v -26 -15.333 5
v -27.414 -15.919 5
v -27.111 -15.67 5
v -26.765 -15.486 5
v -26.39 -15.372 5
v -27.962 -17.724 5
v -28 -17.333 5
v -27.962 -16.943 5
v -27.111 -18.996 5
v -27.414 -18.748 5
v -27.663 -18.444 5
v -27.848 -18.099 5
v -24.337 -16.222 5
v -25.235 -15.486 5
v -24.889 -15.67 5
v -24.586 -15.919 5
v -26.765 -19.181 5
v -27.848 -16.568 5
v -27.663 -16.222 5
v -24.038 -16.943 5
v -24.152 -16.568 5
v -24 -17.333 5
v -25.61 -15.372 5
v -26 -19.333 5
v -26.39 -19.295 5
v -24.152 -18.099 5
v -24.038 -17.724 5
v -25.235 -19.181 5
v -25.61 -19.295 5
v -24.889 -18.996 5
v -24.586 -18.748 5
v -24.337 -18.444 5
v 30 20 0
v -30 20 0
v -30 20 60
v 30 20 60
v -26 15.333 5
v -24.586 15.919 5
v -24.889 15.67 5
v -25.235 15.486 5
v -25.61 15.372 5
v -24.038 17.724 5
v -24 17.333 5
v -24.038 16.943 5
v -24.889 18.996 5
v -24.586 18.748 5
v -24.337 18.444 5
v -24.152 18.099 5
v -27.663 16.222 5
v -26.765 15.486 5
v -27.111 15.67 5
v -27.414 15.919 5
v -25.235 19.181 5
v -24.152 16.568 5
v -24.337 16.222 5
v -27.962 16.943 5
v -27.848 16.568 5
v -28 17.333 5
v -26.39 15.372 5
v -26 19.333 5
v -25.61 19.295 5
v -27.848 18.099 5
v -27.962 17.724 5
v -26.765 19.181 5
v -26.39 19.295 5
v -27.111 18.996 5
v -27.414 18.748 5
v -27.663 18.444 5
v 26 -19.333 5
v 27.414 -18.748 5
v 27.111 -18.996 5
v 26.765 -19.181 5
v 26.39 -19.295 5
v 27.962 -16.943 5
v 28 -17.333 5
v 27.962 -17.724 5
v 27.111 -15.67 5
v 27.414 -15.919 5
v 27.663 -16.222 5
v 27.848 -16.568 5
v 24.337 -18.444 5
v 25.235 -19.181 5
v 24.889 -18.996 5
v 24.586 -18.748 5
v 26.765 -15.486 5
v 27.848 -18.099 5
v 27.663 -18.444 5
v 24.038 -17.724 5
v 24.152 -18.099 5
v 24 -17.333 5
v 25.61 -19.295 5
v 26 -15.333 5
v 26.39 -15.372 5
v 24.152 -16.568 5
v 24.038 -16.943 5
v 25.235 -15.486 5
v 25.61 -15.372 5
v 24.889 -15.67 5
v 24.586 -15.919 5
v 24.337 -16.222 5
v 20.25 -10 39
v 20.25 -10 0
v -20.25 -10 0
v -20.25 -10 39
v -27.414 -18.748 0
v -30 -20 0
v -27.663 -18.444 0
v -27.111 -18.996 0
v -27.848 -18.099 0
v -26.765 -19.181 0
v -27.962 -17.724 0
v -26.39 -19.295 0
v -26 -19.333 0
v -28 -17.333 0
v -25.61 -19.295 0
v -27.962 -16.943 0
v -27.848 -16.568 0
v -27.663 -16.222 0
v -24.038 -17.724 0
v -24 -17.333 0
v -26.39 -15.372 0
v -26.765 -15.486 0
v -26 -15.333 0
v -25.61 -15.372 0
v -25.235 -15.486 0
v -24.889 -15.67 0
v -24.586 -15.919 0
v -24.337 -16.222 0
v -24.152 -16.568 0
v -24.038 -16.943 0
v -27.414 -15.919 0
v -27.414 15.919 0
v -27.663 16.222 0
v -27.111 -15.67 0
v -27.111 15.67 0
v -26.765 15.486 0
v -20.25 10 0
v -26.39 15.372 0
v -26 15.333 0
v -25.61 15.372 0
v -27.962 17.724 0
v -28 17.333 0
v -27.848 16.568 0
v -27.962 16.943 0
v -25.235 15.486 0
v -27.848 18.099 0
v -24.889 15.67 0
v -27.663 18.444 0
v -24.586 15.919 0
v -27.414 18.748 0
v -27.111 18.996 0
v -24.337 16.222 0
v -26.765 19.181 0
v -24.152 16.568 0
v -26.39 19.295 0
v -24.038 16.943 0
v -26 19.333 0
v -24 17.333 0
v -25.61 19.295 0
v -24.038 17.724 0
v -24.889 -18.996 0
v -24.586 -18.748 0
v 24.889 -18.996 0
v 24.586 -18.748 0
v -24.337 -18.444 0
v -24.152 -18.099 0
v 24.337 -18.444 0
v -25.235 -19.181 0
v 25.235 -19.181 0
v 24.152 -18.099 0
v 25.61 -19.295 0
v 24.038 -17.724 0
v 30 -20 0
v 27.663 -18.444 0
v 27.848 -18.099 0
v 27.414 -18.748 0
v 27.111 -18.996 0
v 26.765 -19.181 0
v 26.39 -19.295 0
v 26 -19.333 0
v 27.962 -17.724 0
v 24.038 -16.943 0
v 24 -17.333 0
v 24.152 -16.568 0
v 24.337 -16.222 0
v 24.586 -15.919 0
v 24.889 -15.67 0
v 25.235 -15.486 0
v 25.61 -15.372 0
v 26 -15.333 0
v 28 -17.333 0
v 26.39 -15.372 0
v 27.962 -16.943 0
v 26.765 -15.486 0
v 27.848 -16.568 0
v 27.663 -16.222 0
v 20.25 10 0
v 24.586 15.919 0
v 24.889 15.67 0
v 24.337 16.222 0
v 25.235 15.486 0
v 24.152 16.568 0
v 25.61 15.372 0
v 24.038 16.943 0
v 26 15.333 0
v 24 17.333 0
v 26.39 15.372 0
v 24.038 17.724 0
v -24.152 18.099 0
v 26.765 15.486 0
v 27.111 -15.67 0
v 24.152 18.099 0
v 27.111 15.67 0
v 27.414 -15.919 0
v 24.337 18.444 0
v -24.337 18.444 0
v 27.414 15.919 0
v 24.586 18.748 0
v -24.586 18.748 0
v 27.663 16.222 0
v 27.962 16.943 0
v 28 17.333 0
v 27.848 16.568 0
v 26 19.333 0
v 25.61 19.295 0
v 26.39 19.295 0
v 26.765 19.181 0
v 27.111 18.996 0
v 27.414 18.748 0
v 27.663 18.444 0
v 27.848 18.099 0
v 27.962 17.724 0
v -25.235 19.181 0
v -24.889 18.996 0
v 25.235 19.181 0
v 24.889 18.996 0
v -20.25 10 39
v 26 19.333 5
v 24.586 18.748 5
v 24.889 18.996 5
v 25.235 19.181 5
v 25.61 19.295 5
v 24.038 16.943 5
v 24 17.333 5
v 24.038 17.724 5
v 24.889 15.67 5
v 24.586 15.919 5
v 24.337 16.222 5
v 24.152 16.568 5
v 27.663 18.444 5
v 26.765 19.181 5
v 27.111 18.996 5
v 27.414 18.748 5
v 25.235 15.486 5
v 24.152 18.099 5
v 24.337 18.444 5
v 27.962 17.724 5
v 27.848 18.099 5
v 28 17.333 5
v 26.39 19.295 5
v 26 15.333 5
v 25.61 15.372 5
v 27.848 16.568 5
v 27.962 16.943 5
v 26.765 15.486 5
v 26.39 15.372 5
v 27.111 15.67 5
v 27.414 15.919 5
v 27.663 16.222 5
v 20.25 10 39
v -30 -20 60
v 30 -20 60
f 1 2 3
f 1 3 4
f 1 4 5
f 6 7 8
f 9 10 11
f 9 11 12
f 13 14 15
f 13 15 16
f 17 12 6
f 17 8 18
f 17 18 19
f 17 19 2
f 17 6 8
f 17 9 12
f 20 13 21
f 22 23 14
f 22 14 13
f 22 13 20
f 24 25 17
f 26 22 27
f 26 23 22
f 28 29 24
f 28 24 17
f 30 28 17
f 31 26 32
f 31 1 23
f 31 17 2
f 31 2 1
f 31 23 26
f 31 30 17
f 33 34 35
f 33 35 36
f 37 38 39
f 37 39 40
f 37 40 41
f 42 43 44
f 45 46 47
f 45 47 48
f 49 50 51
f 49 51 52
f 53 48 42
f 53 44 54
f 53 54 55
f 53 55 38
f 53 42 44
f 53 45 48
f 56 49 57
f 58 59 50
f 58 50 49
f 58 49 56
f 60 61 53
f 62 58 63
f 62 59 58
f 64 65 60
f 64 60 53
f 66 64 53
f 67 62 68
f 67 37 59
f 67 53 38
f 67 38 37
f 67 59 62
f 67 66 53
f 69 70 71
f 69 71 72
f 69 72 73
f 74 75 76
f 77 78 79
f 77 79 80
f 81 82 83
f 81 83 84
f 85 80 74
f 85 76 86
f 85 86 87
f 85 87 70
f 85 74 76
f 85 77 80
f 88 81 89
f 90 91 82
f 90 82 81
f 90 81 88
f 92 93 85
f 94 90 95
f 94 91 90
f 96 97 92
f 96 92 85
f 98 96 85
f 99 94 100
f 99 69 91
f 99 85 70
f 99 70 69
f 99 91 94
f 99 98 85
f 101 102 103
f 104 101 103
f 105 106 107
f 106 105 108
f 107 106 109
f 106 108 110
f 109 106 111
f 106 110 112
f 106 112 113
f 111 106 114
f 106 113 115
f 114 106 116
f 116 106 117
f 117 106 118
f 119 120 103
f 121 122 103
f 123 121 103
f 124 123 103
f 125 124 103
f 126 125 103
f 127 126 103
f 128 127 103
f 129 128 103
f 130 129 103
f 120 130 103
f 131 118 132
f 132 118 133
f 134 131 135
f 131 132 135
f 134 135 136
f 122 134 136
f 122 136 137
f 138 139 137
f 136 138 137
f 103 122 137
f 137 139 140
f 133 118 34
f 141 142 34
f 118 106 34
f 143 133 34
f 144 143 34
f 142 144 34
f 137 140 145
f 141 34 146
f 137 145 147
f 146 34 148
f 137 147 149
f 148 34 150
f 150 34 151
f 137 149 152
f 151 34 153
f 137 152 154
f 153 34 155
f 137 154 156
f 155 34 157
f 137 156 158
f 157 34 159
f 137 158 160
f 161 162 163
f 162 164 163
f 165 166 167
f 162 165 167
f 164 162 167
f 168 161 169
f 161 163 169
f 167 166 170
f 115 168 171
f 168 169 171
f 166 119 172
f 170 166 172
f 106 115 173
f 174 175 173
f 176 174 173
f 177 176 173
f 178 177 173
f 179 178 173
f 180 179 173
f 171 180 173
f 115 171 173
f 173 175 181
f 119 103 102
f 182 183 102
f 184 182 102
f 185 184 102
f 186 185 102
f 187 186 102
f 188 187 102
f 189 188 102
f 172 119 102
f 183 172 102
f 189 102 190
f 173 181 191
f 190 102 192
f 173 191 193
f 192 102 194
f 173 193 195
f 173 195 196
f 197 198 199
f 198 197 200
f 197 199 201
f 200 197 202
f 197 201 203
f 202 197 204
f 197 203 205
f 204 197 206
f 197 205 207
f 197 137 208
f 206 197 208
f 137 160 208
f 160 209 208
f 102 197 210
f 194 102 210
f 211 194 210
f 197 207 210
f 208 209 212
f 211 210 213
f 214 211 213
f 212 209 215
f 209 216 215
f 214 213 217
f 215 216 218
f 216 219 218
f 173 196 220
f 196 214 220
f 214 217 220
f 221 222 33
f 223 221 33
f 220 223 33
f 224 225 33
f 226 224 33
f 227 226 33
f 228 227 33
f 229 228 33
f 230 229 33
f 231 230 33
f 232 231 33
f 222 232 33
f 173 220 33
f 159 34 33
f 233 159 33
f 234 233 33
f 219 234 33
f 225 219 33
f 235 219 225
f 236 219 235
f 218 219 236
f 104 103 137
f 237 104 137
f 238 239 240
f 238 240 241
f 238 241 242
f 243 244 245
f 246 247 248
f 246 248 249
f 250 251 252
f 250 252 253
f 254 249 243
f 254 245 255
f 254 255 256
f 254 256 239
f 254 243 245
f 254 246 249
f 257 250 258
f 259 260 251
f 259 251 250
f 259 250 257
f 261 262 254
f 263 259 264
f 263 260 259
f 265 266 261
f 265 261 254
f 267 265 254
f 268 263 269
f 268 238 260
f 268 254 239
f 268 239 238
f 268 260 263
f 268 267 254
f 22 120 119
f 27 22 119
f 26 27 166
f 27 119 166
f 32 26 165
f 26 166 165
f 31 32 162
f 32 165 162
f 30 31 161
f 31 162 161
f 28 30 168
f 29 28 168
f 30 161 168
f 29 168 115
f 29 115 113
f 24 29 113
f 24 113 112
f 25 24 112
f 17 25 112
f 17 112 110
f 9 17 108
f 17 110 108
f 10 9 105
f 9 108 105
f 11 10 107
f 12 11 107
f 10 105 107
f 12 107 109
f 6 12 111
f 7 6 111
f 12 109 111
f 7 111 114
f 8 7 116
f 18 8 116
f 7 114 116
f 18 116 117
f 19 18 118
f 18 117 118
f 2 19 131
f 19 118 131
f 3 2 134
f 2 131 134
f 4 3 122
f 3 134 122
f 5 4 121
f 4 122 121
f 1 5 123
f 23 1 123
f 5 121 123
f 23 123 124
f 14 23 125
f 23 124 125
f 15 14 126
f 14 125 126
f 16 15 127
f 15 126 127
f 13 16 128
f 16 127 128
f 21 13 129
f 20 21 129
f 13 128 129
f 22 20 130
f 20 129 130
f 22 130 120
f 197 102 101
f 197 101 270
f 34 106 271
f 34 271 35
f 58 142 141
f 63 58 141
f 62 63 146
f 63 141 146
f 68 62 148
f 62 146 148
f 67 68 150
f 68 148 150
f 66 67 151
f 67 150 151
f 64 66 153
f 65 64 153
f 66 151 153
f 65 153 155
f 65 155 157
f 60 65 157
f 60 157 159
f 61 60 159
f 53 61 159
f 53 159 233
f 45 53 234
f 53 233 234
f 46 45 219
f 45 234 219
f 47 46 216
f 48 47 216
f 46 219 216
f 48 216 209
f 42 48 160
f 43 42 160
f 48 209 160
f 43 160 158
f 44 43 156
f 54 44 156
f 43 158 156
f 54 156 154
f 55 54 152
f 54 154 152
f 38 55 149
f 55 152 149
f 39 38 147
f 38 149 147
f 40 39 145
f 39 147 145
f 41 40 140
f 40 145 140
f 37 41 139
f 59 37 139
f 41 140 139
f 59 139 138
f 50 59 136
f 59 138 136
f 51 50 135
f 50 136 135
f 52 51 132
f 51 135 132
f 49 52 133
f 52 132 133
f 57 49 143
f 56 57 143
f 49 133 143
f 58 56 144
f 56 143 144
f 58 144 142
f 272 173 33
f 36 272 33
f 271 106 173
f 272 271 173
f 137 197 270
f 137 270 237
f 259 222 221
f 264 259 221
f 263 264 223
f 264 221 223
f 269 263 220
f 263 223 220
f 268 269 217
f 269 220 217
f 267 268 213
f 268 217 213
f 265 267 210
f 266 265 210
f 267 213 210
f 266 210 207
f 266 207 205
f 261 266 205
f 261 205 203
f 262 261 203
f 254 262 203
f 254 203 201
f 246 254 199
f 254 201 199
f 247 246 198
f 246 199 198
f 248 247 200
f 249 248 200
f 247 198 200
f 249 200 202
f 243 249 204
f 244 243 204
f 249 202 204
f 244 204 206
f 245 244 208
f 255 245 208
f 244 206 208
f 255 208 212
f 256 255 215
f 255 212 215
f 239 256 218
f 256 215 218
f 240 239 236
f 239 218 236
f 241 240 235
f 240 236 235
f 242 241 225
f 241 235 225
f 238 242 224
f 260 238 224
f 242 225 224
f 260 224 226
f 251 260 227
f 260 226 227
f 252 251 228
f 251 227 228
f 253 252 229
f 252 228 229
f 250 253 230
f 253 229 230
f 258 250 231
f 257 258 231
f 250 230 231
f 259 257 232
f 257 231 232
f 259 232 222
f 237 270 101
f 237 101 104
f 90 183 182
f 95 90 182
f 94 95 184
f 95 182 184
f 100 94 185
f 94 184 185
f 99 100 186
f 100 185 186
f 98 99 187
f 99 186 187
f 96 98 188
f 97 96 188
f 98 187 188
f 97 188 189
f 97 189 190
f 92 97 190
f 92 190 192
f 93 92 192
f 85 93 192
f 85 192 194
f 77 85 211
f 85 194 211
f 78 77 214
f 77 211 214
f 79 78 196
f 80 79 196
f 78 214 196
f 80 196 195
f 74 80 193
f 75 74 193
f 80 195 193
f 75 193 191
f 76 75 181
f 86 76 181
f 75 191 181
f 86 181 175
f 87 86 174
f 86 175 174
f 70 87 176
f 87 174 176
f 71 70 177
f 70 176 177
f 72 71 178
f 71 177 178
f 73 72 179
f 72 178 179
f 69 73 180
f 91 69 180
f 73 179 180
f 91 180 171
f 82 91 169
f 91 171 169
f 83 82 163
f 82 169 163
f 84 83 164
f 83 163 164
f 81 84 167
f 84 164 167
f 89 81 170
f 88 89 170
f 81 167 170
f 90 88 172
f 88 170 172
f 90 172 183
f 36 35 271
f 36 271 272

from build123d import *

# Parameters (mm, degrees)
SKETCH1_W           = 60
SKETCH1_H           = 40
BOSS_EXTRUDE1_DEPTH = 60
SKETCH2_W           = 40.5
SKETCH2_H           = 20
CUT_EXTRUDE1_DEPTH  = 39
SKETCH3_R           = 2
CUT_EXTRUDE2_DEPTH  = 5


with BuildPart() as part:
    # Sketch1 → Boss-Extrude1 (new body)
    with BuildSketch(Plane.XY):
        Rectangle(SKETCH1_W, SKETCH1_H)
    extrude(amount=BOSS_EXTRUDE1_DEPTH)

    # Sketch2 → Cut-Extrude1 (cut)
    with BuildSketch(Plane(origin=(0, 0, 0), x_dir=(-1, 0, 0), z_dir=(0, 0, -1))):
        Rectangle(SKETCH2_W, SKETCH2_H)
    extrude(amount=-CUT_EXTRUDE1_DEPTH, mode=Mode.SUBTRACT)

    # Sketch3 → Cut-Extrude2 (cut)
    with BuildSketch(Plane(origin=(0, 0, 0), x_dir=(-1, 0, 0), z_dir=(0, 0, -1))):
        with Locations((26, 17.333333333)):
            Circle(SKETCH3_R)
        with Locations(Location((-26, 17.333333333, 0), (0, 0, 180))):
            Circle(SKETCH3_R)
        with Locations(Location((26, -17.333333333, 0), (0, 0, 180))):
            Circle(SKETCH3_R)
        with Locations((-26, -17.333333333)):
            Circle(SKETCH3_R)
    extrude(amount=-CUT_EXTRUDE2_DEPTH, mode=Mode.SUBTRACT)


solid = part.part
